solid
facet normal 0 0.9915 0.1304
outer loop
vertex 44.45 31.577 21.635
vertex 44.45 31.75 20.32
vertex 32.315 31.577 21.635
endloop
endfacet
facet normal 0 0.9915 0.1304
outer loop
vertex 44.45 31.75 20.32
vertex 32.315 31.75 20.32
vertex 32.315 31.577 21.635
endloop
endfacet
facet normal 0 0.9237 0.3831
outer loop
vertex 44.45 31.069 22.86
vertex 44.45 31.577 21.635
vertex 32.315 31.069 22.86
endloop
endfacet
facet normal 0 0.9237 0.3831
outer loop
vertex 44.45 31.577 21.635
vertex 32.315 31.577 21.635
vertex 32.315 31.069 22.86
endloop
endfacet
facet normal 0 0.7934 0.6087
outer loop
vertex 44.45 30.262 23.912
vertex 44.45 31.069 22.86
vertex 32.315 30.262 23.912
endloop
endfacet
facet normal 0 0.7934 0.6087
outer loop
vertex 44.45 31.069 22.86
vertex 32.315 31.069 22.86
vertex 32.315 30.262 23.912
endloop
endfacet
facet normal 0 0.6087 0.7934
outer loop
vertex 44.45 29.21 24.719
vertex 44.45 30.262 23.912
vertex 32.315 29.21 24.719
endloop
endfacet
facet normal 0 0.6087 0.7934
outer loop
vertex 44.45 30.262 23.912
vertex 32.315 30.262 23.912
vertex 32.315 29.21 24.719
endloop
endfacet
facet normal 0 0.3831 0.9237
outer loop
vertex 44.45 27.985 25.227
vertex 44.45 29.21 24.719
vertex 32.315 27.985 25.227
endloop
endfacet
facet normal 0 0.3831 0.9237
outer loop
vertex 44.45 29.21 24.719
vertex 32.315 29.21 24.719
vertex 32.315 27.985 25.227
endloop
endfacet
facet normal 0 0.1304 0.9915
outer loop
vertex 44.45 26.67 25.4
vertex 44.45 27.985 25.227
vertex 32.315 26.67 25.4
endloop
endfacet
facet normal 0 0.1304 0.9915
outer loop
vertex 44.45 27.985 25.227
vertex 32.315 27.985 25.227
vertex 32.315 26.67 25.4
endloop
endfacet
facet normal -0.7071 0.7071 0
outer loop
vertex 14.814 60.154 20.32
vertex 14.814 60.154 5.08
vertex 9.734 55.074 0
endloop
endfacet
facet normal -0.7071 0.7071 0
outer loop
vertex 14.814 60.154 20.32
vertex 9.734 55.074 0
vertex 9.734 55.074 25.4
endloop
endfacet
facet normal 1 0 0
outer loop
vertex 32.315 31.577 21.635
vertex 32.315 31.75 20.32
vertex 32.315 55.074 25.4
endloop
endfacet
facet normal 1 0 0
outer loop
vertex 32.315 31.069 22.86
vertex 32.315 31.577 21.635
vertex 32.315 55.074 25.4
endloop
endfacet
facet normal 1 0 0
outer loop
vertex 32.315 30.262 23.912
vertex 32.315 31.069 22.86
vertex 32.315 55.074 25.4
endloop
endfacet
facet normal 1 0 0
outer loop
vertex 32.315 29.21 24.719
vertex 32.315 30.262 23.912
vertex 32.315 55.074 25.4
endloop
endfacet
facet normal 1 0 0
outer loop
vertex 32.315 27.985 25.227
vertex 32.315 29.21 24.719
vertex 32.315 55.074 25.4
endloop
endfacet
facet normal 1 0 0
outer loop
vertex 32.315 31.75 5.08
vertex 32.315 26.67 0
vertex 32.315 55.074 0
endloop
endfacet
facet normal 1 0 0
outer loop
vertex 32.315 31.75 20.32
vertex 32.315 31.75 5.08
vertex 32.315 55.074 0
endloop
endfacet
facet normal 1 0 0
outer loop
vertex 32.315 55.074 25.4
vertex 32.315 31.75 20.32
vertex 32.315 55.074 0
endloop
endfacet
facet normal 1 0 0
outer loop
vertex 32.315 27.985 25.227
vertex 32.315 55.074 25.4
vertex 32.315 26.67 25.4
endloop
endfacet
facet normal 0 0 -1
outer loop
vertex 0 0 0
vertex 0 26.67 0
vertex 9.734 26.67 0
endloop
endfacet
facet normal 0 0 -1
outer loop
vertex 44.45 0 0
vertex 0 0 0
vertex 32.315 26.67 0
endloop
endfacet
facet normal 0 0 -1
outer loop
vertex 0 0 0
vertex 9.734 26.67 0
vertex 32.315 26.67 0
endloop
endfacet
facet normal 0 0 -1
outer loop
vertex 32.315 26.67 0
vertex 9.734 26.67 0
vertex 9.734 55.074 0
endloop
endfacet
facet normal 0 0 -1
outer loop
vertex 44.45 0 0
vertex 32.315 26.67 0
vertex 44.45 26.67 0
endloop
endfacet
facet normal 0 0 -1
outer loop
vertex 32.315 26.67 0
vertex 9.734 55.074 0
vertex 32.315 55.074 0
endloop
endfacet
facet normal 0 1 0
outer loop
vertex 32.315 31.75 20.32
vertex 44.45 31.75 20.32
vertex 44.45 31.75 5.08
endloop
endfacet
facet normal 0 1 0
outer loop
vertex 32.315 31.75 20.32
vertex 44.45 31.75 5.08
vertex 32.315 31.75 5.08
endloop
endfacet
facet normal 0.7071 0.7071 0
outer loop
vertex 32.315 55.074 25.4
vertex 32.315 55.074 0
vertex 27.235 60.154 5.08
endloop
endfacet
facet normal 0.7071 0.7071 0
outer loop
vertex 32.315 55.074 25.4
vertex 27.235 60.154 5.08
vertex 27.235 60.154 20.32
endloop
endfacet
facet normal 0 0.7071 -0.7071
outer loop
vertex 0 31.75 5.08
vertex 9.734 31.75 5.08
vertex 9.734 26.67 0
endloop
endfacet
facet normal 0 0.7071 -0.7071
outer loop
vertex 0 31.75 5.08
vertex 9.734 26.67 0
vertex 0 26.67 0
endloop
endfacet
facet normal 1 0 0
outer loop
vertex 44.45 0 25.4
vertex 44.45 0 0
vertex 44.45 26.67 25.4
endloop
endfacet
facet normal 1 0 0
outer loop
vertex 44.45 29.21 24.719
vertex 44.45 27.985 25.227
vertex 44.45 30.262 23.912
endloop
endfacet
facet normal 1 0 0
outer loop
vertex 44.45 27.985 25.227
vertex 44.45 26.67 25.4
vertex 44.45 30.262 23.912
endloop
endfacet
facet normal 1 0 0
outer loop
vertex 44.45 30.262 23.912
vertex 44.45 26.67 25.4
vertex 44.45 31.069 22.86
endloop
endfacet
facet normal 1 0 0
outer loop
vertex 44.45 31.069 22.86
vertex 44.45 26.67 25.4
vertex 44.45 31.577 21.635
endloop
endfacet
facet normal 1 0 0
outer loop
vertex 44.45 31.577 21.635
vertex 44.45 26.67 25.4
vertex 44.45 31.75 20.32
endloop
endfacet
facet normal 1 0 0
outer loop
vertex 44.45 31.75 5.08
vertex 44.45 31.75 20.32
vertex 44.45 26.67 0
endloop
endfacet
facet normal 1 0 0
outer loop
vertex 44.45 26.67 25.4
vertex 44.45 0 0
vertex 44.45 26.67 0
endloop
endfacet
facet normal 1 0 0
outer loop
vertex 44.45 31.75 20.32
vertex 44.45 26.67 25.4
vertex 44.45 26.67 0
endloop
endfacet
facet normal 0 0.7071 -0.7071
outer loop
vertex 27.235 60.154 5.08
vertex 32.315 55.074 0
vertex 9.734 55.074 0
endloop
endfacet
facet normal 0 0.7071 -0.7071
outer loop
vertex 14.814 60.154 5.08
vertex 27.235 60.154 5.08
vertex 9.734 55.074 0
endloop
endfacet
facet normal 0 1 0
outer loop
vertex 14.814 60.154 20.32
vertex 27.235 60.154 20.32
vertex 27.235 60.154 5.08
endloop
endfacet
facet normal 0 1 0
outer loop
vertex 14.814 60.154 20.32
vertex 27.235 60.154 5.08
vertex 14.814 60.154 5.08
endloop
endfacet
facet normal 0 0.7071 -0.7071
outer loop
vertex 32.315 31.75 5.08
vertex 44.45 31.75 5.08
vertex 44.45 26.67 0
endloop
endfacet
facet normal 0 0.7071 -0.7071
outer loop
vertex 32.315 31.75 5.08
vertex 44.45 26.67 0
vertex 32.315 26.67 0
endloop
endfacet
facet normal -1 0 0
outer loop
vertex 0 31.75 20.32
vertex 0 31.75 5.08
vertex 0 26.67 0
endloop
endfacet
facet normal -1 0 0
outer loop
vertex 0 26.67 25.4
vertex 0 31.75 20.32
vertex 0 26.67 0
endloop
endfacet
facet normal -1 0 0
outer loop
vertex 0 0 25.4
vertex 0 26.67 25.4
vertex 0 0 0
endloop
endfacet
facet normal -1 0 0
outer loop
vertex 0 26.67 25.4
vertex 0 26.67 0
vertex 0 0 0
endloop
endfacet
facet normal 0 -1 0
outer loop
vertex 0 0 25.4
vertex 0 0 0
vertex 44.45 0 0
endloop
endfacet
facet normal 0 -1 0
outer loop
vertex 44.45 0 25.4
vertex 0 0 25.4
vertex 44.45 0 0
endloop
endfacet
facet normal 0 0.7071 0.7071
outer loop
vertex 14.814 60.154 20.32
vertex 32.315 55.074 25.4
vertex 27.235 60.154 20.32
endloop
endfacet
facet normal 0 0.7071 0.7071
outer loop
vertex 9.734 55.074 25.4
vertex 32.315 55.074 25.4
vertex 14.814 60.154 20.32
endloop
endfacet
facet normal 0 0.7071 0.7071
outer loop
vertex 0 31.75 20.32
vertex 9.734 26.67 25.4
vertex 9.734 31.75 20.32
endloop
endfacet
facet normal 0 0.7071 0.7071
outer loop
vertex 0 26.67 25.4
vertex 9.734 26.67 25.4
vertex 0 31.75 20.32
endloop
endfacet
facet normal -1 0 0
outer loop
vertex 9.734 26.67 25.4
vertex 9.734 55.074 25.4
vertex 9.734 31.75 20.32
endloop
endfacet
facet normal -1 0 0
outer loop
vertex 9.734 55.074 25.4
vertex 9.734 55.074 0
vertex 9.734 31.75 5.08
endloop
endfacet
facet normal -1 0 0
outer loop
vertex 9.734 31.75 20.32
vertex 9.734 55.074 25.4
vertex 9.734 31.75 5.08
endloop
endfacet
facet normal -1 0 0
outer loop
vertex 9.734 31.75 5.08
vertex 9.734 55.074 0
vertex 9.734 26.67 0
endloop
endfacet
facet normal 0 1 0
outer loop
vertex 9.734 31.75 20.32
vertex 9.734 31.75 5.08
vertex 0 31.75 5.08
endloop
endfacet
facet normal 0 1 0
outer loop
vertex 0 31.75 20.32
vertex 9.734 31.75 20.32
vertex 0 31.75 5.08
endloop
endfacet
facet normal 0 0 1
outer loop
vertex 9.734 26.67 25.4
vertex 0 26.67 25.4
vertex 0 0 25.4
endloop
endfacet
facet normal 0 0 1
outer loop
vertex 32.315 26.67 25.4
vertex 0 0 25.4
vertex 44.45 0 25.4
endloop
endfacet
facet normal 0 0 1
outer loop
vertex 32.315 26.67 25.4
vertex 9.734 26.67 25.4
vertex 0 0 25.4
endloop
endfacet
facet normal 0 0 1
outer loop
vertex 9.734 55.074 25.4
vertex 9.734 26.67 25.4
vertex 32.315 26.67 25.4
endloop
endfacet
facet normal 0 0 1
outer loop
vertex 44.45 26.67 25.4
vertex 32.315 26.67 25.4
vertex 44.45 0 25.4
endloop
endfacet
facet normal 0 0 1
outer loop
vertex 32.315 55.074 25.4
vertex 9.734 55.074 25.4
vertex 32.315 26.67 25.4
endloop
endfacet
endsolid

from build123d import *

# Parameters (mm, degrees)
F1_DEPTH = 25.4
F2_SIZE  = 5.08
F3_SIZE  = 5.08
F4_R     = 5.08
F5_SIZE  = 5.08
F6_SIZE  = 5.08


with BuildPart() as f1:
    # F0 (on Top) → F1 (new body)
    with BuildSketch(Plane.XY):
        Polygon((0, 31.75), (0, 0), (44.45, 0), (44.45, 31.75), (32.315474, 31.75), (32.315474, 60.153503), (21.024525, 60.153503), (9.733576, 60.153503), (9.733576, 31.75), align=None)
    extrude(amount=F1_DEPTH)

    # F2
    f2_edges = [f1.edges().sort_by_distance(p)[0] for p in [
        (4.866788, 31.75, 25.4),
    ]]
    chamfer(f2_edges, length=F2_SIZE)

    # F3
    f3_edges = [f1.edges().sort_by_distance(p)[0] for p in [
        (4.866788, 31.75, 0),
    ]]
    chamfer(f3_edges, length=F3_SIZE)

    # F4
    f4_edges = [f1.edges().sort_by_distance(p)[0] for p in [
        (38.382737, 31.75, 25.4),
    ]]
    fillet(f4_edges, radius=F4_R)

    # F5
    f5_edges = [f1.edges().sort_by_distance(p)[0] for p in [
        (38.382737, 31.75, 0),
    ]]
    chamfer(f5_edges, length=F5_SIZE)

    # F6
    f6_edges = [f1.edges().sort_by_distance(p)[0] for p in [
        (32.315474, 60.153503, 12.7),
        (21.024525, 60.153503, 25.4),
        (9.733576, 60.153503, 12.7),
        (21.024525, 60.153503, 0),
    ]]
    chamfer(f6_edges, length=F6_SIZE)


solid = f1.part
